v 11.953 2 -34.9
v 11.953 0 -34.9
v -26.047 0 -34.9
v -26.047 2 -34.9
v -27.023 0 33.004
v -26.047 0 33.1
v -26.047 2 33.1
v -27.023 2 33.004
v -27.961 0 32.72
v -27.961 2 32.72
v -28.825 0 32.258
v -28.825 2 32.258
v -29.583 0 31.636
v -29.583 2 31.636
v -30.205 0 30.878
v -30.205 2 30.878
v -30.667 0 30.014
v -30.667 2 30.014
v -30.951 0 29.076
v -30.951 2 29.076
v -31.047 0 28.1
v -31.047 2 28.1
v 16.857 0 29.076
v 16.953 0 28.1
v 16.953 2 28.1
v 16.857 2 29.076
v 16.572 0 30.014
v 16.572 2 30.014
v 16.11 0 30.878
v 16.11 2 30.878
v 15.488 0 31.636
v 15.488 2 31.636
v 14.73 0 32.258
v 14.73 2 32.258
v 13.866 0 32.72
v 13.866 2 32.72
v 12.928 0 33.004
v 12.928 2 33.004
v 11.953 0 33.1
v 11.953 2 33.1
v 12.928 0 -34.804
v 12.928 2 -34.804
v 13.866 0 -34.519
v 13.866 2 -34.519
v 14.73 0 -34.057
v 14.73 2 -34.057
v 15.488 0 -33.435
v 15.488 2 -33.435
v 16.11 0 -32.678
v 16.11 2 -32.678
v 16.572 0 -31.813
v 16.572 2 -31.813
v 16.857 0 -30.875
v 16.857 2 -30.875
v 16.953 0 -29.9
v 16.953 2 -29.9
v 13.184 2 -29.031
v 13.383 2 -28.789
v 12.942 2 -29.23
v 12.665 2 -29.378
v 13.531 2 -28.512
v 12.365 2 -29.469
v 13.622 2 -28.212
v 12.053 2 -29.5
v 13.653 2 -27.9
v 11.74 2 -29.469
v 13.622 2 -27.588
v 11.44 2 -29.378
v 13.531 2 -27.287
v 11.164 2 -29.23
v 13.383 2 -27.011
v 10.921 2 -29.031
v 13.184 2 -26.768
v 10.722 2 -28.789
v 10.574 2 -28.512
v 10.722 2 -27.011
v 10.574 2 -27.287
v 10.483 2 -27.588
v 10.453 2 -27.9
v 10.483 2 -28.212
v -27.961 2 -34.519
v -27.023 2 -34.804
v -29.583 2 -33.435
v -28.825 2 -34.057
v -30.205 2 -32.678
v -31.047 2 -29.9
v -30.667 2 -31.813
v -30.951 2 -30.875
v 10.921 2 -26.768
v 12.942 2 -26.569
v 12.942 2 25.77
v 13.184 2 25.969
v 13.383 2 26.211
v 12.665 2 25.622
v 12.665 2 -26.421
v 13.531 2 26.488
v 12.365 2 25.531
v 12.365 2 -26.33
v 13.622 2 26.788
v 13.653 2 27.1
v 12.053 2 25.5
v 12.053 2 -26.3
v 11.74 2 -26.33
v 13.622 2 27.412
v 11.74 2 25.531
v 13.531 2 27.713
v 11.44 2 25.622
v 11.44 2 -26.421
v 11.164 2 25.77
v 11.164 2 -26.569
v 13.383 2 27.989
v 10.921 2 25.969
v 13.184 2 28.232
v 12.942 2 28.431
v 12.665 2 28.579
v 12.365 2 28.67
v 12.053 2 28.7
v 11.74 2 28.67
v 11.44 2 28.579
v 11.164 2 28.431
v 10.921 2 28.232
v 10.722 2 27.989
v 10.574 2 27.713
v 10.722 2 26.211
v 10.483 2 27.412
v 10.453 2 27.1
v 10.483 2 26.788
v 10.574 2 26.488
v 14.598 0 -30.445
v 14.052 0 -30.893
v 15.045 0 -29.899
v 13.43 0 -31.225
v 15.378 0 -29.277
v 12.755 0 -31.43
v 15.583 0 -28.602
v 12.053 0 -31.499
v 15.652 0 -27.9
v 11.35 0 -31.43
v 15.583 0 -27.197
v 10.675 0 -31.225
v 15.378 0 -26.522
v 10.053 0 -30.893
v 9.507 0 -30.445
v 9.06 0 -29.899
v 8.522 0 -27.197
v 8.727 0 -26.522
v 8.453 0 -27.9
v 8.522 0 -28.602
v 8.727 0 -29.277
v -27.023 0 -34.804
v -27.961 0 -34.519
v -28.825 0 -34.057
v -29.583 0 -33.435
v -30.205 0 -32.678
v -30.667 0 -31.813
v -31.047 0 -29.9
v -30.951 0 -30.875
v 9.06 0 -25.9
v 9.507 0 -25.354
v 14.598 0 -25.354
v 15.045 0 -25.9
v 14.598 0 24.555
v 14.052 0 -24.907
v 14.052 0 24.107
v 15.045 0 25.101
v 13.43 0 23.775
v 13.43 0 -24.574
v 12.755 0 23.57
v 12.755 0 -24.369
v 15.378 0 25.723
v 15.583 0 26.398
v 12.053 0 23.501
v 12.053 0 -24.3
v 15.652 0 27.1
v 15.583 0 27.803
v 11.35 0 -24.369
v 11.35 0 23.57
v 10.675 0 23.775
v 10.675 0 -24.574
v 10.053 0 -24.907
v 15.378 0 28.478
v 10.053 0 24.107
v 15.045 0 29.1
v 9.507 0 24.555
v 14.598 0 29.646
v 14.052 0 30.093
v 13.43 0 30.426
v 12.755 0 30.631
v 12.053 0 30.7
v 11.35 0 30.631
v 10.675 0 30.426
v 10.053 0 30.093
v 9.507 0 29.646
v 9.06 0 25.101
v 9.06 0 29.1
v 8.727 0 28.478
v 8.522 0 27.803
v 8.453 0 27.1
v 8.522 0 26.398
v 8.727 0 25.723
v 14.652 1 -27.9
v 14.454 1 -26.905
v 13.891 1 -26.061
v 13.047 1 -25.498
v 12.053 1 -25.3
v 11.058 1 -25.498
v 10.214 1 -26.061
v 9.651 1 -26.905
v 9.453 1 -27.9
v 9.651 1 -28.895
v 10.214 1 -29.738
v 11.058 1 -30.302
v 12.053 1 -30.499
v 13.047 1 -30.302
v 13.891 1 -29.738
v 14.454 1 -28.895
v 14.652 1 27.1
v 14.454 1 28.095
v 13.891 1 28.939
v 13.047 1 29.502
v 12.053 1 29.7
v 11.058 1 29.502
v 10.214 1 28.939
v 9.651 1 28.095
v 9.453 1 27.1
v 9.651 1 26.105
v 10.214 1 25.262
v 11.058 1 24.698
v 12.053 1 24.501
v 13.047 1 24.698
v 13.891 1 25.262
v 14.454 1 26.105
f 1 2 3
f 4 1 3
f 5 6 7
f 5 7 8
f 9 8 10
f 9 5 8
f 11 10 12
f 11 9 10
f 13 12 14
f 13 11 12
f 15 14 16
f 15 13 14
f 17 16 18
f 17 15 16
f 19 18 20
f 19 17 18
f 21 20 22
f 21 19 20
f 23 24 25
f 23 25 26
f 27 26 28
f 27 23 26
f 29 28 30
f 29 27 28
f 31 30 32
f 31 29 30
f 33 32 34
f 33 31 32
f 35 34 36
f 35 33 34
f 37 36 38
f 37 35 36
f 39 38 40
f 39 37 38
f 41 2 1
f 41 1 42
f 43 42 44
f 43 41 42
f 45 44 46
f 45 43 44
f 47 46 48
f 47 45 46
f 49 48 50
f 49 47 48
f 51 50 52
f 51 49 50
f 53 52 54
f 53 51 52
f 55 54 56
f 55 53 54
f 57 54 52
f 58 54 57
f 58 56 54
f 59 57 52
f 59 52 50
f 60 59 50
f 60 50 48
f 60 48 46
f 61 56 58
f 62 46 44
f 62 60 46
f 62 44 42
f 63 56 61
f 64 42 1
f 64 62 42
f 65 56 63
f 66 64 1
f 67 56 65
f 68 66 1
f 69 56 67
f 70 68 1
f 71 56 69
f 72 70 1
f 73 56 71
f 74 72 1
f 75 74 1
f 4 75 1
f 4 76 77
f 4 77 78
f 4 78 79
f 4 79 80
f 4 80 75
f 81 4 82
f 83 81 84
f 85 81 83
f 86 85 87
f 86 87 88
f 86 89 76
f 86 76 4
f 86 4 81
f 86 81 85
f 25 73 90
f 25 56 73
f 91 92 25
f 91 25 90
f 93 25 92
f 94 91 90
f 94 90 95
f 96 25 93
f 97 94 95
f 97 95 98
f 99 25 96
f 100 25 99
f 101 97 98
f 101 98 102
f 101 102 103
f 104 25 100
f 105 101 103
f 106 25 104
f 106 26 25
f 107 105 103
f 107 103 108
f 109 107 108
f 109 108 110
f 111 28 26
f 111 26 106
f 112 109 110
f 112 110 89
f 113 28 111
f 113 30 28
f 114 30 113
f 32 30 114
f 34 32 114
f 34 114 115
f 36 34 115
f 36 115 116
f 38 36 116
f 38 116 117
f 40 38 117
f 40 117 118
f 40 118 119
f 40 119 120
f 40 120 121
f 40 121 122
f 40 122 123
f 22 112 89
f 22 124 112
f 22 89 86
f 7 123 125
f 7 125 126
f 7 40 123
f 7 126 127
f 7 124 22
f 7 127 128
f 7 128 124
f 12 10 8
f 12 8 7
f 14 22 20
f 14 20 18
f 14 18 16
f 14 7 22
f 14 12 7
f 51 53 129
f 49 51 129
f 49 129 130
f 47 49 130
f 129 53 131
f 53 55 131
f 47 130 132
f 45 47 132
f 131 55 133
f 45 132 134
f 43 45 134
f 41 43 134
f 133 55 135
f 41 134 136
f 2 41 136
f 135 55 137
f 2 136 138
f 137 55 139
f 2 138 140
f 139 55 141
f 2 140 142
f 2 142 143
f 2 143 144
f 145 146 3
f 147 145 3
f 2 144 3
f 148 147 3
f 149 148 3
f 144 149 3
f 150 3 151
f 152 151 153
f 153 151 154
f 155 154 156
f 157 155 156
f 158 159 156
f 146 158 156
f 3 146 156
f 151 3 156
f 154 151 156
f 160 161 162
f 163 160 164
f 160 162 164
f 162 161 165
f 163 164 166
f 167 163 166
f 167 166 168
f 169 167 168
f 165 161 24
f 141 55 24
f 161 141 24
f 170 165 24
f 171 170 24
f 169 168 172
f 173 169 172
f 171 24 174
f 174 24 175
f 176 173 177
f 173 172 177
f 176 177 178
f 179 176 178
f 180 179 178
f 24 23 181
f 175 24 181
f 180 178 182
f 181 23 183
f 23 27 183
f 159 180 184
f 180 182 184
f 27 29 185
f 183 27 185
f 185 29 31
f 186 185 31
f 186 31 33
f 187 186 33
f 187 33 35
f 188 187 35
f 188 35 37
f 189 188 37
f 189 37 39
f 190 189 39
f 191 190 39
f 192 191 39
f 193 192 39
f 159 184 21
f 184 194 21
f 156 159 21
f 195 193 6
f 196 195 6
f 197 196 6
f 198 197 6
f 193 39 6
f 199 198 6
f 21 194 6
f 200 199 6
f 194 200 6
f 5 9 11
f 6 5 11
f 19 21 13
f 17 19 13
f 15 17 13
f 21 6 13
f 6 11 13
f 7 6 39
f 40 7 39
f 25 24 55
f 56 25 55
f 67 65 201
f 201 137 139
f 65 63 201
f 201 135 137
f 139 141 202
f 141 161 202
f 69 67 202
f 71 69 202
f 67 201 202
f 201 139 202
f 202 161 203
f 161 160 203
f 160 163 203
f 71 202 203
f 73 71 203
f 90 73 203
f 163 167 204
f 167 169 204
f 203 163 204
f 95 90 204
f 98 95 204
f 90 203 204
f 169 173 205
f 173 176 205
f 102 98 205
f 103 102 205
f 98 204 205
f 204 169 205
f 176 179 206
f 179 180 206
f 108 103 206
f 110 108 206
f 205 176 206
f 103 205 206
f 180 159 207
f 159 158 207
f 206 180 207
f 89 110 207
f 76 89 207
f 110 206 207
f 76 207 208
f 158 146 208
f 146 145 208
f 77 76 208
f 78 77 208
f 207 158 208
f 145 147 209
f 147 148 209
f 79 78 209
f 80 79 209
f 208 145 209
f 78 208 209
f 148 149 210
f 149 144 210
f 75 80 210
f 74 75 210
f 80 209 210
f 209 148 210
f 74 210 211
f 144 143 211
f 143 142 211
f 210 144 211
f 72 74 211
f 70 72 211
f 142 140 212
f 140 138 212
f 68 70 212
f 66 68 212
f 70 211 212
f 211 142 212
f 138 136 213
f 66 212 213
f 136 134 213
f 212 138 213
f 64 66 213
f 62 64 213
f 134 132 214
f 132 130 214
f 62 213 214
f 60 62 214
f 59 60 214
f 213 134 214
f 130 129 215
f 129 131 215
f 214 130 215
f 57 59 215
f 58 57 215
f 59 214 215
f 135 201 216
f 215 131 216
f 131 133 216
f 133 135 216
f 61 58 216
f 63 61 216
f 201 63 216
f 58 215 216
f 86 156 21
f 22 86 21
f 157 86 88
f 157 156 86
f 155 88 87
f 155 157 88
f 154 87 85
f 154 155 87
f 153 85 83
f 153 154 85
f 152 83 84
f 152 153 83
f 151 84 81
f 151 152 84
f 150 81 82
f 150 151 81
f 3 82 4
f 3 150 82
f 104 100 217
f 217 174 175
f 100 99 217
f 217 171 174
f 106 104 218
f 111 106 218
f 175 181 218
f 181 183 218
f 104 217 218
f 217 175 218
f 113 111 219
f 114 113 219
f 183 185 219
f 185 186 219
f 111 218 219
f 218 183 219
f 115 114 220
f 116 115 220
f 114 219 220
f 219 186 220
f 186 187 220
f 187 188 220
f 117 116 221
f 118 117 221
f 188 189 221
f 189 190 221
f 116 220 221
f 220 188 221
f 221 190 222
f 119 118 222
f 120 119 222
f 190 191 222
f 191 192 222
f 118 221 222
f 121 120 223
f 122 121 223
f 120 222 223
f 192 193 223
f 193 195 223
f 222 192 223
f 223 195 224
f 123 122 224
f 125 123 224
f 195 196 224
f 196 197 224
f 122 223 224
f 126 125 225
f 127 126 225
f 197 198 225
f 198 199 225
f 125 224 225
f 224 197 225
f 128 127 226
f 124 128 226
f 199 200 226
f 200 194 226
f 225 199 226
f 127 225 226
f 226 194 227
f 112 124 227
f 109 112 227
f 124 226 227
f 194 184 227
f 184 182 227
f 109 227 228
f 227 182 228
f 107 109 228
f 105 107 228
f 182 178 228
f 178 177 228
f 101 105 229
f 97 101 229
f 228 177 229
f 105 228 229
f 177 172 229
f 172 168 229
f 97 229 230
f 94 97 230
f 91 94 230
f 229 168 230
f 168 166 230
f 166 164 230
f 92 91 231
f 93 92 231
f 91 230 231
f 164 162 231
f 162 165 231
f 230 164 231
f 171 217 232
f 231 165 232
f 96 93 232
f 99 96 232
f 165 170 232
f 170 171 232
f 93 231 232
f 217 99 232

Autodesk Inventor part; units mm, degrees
ref_plane "YZ Plane" through (0, 0, 0) normal (1, 0, 0) x (0, 1, 0)
ref_plane "XZ Plane" through (0, 0, 0) normal (0, 1, 0) x (-1, 0, 0)
ref_plane "XY Plane" through (0, 0, 0) normal (0, 0, 1) x (1, 0, 0)
sketch "Эскиз1" plane through (0, 0, 0) normal (0, 1, 0) x (-1, 0, 0)
  line L0 (26.0474, 33.1003) -> (-11.9526, 33.1003)
  line L1 (-16.9526, 28.1003) -> (-16.9526, -29.8997)
  line L2 (-11.9526, -34.8997) -> (26.0474, -34.8997)
  line L3 (31.0474, -29.8997) -> (31.0474, 28.1003)
  arc A0 (31.0474, 28.1003) -> (26.0474, 33.1003) centre (26.0474, 28.1003) ccw
  arc A1 (-11.9526, 33.1003) -> (-16.9526, 28.1003) centre (-11.9526, 28.1003) ccw
  arc A2 (-16.9526, -29.8997) -> (-11.9526, -34.8997) centre (-11.9526, -29.8997) ccw
  arc A3 (26.0474, -34.8997) -> (31.0474, -29.8997) centre (26.0474, -29.8997) ccw
  point P0 (0, 0)
  dimension "d0" = 68
  dimension "d1" = 48
  dimension "d2" = 5
extrude "Выдавливание1" add sketch "Эскиз1" along normal blind 2
sketch "Эскиз2" plane through (0, 0, 0) normal (0, -1, 0) x (1, 0, 0)
  circle A0 centre (12.0526, -27.8997) radius 1.6
  line L0 (11.9526, -34.8997) -> (-26.0474, -34.8997) projected
  line L1 (16.9526, 28.1003) -> (16.9526, -29.8997) projected
  circle A1 centre (12.0526, 27.1003) radius 1.6
  line L2 (-26.0474, 33.1003) -> (11.9526, 33.1003) projected
  point P0 (0, 0)
  dimension "d7" = 7
  dimension "d9" = 4.9
  dimension "d13" = 4.9
  dimension "d14" = 6
extrude "Выдавливание2" cut sketch "Эскиз2" against normal blind 10
chamfer "Фаска1" distance 2 angle 45 2 edges at (10.4526, 0, 27.1003) (10.4526, 0, -27.8997)
properties part number "Krishka"
